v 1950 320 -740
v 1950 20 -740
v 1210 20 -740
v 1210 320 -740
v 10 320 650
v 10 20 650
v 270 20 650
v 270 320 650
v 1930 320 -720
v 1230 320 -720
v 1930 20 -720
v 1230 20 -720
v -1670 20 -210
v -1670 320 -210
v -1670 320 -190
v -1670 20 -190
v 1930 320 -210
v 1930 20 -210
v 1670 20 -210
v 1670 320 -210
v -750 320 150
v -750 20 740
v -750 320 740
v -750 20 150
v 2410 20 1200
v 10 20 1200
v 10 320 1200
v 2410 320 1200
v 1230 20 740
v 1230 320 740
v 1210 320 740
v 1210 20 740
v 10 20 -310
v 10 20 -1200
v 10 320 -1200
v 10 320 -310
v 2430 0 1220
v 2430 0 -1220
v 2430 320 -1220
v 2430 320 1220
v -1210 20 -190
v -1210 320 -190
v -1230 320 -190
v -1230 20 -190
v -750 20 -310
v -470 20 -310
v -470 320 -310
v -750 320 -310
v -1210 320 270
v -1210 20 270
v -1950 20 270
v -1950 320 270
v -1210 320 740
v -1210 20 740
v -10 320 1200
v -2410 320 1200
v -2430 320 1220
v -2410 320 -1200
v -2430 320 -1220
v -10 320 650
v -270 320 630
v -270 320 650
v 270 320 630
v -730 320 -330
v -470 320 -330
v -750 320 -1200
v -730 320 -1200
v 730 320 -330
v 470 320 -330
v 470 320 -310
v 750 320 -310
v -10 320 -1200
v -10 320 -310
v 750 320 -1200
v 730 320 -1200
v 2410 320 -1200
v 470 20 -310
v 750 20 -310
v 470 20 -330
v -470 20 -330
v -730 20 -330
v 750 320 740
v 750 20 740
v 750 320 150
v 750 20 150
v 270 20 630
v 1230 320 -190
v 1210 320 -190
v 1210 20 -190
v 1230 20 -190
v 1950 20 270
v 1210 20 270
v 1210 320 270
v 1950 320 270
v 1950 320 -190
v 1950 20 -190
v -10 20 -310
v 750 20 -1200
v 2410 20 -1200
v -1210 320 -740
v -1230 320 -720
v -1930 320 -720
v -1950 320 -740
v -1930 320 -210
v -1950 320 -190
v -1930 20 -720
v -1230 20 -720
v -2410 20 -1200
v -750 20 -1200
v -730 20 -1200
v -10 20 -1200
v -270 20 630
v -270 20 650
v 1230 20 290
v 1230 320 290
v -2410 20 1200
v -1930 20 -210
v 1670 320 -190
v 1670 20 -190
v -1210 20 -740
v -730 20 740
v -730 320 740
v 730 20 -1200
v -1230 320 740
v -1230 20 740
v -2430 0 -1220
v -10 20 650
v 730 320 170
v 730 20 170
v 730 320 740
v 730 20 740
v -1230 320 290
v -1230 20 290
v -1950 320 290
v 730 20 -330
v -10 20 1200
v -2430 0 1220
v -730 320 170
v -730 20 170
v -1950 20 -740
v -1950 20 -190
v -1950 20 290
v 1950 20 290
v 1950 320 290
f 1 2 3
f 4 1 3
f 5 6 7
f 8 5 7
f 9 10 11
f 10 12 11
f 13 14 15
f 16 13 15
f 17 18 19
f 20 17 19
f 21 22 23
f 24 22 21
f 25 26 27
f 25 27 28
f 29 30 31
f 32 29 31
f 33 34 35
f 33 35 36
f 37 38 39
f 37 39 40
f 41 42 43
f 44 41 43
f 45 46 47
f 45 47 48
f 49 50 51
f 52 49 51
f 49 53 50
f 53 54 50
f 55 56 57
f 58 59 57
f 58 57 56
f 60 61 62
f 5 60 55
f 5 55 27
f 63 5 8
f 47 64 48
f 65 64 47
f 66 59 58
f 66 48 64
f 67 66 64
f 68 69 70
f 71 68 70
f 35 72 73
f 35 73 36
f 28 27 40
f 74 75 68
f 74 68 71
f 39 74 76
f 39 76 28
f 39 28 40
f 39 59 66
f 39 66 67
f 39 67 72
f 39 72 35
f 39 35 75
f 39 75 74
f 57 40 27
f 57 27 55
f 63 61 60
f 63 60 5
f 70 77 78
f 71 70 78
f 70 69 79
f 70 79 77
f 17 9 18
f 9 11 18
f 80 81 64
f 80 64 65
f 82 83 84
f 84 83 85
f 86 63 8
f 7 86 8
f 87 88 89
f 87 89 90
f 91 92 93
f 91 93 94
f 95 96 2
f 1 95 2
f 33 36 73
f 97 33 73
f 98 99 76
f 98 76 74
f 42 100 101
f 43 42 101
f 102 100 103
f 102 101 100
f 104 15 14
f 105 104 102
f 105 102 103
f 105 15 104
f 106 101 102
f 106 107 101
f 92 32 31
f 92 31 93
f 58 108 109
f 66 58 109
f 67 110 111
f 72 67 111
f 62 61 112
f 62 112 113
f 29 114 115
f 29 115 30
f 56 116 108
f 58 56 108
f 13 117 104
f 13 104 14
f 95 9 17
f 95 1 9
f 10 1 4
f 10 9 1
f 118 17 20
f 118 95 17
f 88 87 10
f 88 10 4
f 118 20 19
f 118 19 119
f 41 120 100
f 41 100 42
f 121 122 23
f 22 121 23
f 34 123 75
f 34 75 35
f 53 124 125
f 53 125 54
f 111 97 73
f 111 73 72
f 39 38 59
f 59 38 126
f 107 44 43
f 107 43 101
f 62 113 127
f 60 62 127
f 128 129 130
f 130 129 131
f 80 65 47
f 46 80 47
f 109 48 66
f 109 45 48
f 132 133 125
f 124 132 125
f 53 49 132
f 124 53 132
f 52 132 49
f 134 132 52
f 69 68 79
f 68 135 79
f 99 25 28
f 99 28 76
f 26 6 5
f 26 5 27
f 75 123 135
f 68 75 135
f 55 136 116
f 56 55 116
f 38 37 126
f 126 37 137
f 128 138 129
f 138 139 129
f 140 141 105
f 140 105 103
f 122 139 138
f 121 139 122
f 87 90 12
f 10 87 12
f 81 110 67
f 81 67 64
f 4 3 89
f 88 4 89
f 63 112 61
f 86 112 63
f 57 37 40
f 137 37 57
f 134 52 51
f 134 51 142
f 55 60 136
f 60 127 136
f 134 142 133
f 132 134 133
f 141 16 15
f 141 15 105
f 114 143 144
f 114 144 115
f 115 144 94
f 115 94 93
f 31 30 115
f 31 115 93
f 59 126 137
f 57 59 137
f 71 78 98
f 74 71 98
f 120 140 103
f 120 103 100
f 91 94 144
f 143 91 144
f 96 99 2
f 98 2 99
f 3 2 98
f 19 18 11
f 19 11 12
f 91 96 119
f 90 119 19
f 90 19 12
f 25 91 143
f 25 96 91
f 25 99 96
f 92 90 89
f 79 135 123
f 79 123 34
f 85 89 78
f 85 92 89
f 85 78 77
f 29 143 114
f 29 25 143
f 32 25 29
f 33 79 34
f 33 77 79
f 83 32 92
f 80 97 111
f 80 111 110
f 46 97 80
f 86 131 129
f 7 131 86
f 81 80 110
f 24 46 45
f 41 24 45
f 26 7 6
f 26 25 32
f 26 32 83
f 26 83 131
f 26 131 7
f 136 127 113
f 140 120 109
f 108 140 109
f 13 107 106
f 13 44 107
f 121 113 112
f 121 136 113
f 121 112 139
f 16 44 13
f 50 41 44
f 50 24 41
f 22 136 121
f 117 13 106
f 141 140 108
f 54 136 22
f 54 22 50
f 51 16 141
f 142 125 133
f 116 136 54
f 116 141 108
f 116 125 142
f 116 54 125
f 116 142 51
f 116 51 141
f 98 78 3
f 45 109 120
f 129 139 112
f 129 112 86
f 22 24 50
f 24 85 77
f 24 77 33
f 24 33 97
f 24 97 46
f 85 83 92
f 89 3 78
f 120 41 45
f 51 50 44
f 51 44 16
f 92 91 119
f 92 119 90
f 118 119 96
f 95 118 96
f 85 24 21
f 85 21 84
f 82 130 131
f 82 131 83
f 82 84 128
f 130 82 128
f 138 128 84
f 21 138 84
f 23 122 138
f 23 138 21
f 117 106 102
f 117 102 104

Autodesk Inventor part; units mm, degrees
ref_plane "YZ Plane" through (0, 0, 0) normal (1, 0, 0) x (0, 1, 0)
ref_plane "XZ Plane" through (0, 0, 0) normal (0, 1, 0) x (-1, 0, 0)
ref_plane "XY Plane" through (0, 0, 0) normal (0, 0, 1) x (1, 0, 0)
sketch "Sketch1" plane through (0, 0, 0) normal (0, 1, 0) x (-1, 0, 0)
  line L0 (2430, 1220) -> (0, 1220)
  line L1 (0, -1220) -> (2430, -1220)
  line L2 (2430, -1220) -> (2430, 1220)
  line L3 (2410, 1200) -> (2410, -1200)
  line L4 (10, 650) -> (10, 1200)
  line L5 (740, 150) -> (0, 150)
  line L6 (730, 170) -> (730, 740)
  line L7 (730, 740) -> (750, 740)
  line L8 (750, 740) -> (750, 150)
  line L9 (750, 150) -> (740, 150)
  line L10 (1210, 740) -> (1210, 270)
  line L11 (1230, 290) -> (1230, 740)
  line L12 (1230, 740) -> (1210, 740)
  line L13 (270, 630) -> (270, 650)
  line L14 (10, 1200) -> (2410, 1200)
  line L15 (0, -330) -> (10, -330)
  line L16 (0, -330) -> (10, -330) construction
  line L17 (10, -330) -> (10, -1200)
  line L18 (730, -1200) -> (730, -330)
  line L19 (750, -1200) -> (1600, -1200) construction
  line L20 (730, -330) -> (470, -330)
  line L21 (470, -330) -> (470, -310)
  line L22 (470, -310) -> (750, -310)
  line L23 (750, -310) -> (750, -1200)
  line L24 (2410, -1200) -> (750, -1200)
  line L25 (730, -1200) -> (10, -1200)
  line L26 (0, -1200) -> (730, -1200) construction
  line L27 (750, -1200) -> (870, -1200) construction
  line L28 (1210, 270) -> (1950, 270)
  line L29 (1210, 270) -> (1950, 270) construction
  line L30 (1950, 270) -> (1950, 290)
  line L31 (1950, 290) -> (1230, 290)
  line L32 (1950, -190) -> (1950, -740)
  line L33 (1950, -740) -> (1210, -740)
  line L34 (1210, -740) -> (1210, -190)
  line L35 (1210, -190) -> (1230, -190)
  line L36 (1210, -190) -> (1230, -190) construction
  line L37 (1230, -190) -> (1230, -720)
  line L38 (1230, -720) -> (1930, -720)
  line L39 (1930, -720) -> (1930, -210)
  line L40 (1930, -210) -> (1670, -210)
  line L41 (1670, -210) -> (1670, -190)
  line L42 (1670, -190) -> (1950, -190)
  line L43 (-2430, 1220) -> (0, 1220)
  line L44 (0, -1220) -> (-2430, -1220)
  line L45 (-2430, -1220) -> (-2430, 1220)
  line L46 (-2410, 1200) -> (-2410, -1200)
  line L47 (-10, 650) -> (-10, 1200)
  line L48 (-740, 150) -> (0, 150)
  line L49 (-730, 170) -> (-730, 740)
  line L50 (-730, 740) -> (-750, 740)
  line L51 (-750, 740) -> (-750, 150)
  line L52 (-750, 150) -> (-740, 150)
  line L53 (-1210, 740) -> (-1210, 270)
  line L54 (-1230, 290) -> (-1230, 740)
  line L55 (-1230, 740) -> (-1210, 740)
  line L56 (-270, 630) -> (-270, 650)
  line L57 (-10, 1200) -> (-2410, 1200)
  line L58 (0, -330) -> (-10, -330)
  line L59 (0, -330) -> (-10, -330) construction
  line L60 (-10, -330) -> (-10, -1200)
  line L61 (-730, -1200) -> (-730, -330)
  line L62 (-750, -1200) -> (-1600, -1200) construction
  line L63 (-730, -330) -> (-470, -330)
  line L64 (-470, -330) -> (-470, -310)
  line L65 (-470, -310) -> (-750, -310)
  line L66 (-750, -310) -> (-750, -1200)
  line L67 (-2410, -1200) -> (-750, -1200)
  line L68 (-730, -1200) -> (-10, -1200)
  line L69 (0, -1200) -> (-730, -1200) construction
  line L70 (-750, -1200) -> (-870, -1200) construction
  line L71 (-1210, 270) -> (-1950, 270)
  line L72 (-1210, 270) -> (-1950, 270) construction
  line L73 (-1950, 270) -> (-1950, 290)
  line L74 (-1950, 290) -> (-1230, 290)
  line L75 (-1950, -190) -> (-1950, -740)
  line L76 (-1950, -740) -> (-1210, -740)
  line L77 (-1210, -740) -> (-1210, -190)
  line L78 (-1210, -190) -> (-1230, -190)
  line L79 (-1210, -190) -> (-1230, -190) construction
  line L80 (-1230, -190) -> (-1230, -720)
  line L81 (-1230, -720) -> (-1930, -720)
  line L82 (-1930, -720) -> (-1930, -210)
  line L83 (-1930, -210) -> (-1670, -210)
  line L84 (-1670, -210) -> (-1670, -190)
  line L85 (-1670, -190) -> (-1950, -190)
  line L86 (270, 630) -> (-270, 630)
  line L87 (270, 650) -> (10, 650)
  line L88 (-10, 650) -> (-270, 650)
  line L89 (730, 170) -> (-730, 170)
  point P0 (0, 0)
  dimension "d274" = 4860
  dimension "d275" = 2440
  dimension "d276" = 2400
  dimension "d277" = 2400
  dimension "d278" = 720
  dimension "d279" = 450
  dimension "d280" = 20
  dimension "d281" = 470
  dimension "d282" = 740
  dimension "d283" = 20
  dimension "d284" = 700
  dimension "d285" = 510
  dimension "d286" = 260
  dimension "d287" = 20
  dimension "d288" = 280
  dimension "d289" = 550
  dimension "d290" = 740
  dimension "d291" = 550
  dimension "d292" = 20
  dimension "d293" = 530
  dimension "d294" = 890
  dimension "d295" = 280
  dimension "d296" = 20
  dimension "d297" = 260
  dimension "d298" = 870
  dimension "d300" = 870
  dimension "d301" = 20
  dimension "d302" = 550
  dimension "d303" = 260
  dimension "d304" = 20
  dimension "d305" = 540
  dimension "d306" = 570
  dimension "d307" = 20
  dimension "d308" = 590
  dimension "d309" = 1500
  dimension "d310" = 1460
  dimension "d311" = 2400
  dimension "d312" = 20
  dimension "d313" = 20
  dimension "d314" = 20
  dimension "d315" = 20
  dimension "d316" = 20
  dimension "d318" = 1660
  dimension "d319" = 20
  dimension "d320" = 720
  dimension "d324" = 20
  dimension "d330" = 720
  dimension "d331" = 740
  dimension "d332" = 470
  dimension "d333" = 20
  dimension "d334" = 20
  dimension "d336" = 530
  dimension "d337" = 510
  dimension "d338" = 260
  dimension "d339" = 20
  dimension "d341" = 550
  dimension "d343" = 550
  dimension "d346" = 870
  dimension "d352" = 460
  dimension "d353" = 460
  dimension "d356" = 460
  dimension "d358" = 460
  dimension "d359" = 460
  dimension "d364" = 460
extrude "Extrusion1" add sketch "Sketch1" along normal blind 20 contours L3 L24 L23 L22 L21 L20 L18 L25 L17 L15 L58 L60 L68 L61 L63 L64 L65 L66 L67 L46 L57 L47 L88 L56 L86 L13 L87 L4 L14
extrude "Extrusion2" add sketch "Sketch1" along normal blind 320
sketch "Sketch5" plane through (0, 20, 0) normal (0, 1, 0) x (1, 0, 0)
  line L0 (-10, 330) -> (10, 330)
  line L1 (-750, -150) -> (750, -150) projected
  line L2 (10, -130) -> (10, -150)
  line L3 (10, -150) -> (-10, -150)
  line L4 (-10, -150) -> (-10, -130)
  line L5 (-10, 330) -> (10, 330)
  line L6 (10, 330) -> (10, 310)
  line L7 (10, 310) -> (-10, 310)
  line L8 (-10, 310) -> (-10, 330)
  line L9 (-10, 310) -> (10, 310)
  line L10 (10, 310) -> (10, -150)
  line L11 (10, -150) -> (-10, -150)
  line L12 (-10, -150) -> (-10, 310)
  point P0 (0, 0)
  point P1 (-470, -150)
  point P2 (470, -150)
  dimension "d190" = 20
  dimension "d193" = 20
  dimension "d194" = 460
extrude "Extrusion5" add sketch "Sketch5" along normal blind 300 contours L0 L6 L7 L8
properties part number "Lapangan2"
